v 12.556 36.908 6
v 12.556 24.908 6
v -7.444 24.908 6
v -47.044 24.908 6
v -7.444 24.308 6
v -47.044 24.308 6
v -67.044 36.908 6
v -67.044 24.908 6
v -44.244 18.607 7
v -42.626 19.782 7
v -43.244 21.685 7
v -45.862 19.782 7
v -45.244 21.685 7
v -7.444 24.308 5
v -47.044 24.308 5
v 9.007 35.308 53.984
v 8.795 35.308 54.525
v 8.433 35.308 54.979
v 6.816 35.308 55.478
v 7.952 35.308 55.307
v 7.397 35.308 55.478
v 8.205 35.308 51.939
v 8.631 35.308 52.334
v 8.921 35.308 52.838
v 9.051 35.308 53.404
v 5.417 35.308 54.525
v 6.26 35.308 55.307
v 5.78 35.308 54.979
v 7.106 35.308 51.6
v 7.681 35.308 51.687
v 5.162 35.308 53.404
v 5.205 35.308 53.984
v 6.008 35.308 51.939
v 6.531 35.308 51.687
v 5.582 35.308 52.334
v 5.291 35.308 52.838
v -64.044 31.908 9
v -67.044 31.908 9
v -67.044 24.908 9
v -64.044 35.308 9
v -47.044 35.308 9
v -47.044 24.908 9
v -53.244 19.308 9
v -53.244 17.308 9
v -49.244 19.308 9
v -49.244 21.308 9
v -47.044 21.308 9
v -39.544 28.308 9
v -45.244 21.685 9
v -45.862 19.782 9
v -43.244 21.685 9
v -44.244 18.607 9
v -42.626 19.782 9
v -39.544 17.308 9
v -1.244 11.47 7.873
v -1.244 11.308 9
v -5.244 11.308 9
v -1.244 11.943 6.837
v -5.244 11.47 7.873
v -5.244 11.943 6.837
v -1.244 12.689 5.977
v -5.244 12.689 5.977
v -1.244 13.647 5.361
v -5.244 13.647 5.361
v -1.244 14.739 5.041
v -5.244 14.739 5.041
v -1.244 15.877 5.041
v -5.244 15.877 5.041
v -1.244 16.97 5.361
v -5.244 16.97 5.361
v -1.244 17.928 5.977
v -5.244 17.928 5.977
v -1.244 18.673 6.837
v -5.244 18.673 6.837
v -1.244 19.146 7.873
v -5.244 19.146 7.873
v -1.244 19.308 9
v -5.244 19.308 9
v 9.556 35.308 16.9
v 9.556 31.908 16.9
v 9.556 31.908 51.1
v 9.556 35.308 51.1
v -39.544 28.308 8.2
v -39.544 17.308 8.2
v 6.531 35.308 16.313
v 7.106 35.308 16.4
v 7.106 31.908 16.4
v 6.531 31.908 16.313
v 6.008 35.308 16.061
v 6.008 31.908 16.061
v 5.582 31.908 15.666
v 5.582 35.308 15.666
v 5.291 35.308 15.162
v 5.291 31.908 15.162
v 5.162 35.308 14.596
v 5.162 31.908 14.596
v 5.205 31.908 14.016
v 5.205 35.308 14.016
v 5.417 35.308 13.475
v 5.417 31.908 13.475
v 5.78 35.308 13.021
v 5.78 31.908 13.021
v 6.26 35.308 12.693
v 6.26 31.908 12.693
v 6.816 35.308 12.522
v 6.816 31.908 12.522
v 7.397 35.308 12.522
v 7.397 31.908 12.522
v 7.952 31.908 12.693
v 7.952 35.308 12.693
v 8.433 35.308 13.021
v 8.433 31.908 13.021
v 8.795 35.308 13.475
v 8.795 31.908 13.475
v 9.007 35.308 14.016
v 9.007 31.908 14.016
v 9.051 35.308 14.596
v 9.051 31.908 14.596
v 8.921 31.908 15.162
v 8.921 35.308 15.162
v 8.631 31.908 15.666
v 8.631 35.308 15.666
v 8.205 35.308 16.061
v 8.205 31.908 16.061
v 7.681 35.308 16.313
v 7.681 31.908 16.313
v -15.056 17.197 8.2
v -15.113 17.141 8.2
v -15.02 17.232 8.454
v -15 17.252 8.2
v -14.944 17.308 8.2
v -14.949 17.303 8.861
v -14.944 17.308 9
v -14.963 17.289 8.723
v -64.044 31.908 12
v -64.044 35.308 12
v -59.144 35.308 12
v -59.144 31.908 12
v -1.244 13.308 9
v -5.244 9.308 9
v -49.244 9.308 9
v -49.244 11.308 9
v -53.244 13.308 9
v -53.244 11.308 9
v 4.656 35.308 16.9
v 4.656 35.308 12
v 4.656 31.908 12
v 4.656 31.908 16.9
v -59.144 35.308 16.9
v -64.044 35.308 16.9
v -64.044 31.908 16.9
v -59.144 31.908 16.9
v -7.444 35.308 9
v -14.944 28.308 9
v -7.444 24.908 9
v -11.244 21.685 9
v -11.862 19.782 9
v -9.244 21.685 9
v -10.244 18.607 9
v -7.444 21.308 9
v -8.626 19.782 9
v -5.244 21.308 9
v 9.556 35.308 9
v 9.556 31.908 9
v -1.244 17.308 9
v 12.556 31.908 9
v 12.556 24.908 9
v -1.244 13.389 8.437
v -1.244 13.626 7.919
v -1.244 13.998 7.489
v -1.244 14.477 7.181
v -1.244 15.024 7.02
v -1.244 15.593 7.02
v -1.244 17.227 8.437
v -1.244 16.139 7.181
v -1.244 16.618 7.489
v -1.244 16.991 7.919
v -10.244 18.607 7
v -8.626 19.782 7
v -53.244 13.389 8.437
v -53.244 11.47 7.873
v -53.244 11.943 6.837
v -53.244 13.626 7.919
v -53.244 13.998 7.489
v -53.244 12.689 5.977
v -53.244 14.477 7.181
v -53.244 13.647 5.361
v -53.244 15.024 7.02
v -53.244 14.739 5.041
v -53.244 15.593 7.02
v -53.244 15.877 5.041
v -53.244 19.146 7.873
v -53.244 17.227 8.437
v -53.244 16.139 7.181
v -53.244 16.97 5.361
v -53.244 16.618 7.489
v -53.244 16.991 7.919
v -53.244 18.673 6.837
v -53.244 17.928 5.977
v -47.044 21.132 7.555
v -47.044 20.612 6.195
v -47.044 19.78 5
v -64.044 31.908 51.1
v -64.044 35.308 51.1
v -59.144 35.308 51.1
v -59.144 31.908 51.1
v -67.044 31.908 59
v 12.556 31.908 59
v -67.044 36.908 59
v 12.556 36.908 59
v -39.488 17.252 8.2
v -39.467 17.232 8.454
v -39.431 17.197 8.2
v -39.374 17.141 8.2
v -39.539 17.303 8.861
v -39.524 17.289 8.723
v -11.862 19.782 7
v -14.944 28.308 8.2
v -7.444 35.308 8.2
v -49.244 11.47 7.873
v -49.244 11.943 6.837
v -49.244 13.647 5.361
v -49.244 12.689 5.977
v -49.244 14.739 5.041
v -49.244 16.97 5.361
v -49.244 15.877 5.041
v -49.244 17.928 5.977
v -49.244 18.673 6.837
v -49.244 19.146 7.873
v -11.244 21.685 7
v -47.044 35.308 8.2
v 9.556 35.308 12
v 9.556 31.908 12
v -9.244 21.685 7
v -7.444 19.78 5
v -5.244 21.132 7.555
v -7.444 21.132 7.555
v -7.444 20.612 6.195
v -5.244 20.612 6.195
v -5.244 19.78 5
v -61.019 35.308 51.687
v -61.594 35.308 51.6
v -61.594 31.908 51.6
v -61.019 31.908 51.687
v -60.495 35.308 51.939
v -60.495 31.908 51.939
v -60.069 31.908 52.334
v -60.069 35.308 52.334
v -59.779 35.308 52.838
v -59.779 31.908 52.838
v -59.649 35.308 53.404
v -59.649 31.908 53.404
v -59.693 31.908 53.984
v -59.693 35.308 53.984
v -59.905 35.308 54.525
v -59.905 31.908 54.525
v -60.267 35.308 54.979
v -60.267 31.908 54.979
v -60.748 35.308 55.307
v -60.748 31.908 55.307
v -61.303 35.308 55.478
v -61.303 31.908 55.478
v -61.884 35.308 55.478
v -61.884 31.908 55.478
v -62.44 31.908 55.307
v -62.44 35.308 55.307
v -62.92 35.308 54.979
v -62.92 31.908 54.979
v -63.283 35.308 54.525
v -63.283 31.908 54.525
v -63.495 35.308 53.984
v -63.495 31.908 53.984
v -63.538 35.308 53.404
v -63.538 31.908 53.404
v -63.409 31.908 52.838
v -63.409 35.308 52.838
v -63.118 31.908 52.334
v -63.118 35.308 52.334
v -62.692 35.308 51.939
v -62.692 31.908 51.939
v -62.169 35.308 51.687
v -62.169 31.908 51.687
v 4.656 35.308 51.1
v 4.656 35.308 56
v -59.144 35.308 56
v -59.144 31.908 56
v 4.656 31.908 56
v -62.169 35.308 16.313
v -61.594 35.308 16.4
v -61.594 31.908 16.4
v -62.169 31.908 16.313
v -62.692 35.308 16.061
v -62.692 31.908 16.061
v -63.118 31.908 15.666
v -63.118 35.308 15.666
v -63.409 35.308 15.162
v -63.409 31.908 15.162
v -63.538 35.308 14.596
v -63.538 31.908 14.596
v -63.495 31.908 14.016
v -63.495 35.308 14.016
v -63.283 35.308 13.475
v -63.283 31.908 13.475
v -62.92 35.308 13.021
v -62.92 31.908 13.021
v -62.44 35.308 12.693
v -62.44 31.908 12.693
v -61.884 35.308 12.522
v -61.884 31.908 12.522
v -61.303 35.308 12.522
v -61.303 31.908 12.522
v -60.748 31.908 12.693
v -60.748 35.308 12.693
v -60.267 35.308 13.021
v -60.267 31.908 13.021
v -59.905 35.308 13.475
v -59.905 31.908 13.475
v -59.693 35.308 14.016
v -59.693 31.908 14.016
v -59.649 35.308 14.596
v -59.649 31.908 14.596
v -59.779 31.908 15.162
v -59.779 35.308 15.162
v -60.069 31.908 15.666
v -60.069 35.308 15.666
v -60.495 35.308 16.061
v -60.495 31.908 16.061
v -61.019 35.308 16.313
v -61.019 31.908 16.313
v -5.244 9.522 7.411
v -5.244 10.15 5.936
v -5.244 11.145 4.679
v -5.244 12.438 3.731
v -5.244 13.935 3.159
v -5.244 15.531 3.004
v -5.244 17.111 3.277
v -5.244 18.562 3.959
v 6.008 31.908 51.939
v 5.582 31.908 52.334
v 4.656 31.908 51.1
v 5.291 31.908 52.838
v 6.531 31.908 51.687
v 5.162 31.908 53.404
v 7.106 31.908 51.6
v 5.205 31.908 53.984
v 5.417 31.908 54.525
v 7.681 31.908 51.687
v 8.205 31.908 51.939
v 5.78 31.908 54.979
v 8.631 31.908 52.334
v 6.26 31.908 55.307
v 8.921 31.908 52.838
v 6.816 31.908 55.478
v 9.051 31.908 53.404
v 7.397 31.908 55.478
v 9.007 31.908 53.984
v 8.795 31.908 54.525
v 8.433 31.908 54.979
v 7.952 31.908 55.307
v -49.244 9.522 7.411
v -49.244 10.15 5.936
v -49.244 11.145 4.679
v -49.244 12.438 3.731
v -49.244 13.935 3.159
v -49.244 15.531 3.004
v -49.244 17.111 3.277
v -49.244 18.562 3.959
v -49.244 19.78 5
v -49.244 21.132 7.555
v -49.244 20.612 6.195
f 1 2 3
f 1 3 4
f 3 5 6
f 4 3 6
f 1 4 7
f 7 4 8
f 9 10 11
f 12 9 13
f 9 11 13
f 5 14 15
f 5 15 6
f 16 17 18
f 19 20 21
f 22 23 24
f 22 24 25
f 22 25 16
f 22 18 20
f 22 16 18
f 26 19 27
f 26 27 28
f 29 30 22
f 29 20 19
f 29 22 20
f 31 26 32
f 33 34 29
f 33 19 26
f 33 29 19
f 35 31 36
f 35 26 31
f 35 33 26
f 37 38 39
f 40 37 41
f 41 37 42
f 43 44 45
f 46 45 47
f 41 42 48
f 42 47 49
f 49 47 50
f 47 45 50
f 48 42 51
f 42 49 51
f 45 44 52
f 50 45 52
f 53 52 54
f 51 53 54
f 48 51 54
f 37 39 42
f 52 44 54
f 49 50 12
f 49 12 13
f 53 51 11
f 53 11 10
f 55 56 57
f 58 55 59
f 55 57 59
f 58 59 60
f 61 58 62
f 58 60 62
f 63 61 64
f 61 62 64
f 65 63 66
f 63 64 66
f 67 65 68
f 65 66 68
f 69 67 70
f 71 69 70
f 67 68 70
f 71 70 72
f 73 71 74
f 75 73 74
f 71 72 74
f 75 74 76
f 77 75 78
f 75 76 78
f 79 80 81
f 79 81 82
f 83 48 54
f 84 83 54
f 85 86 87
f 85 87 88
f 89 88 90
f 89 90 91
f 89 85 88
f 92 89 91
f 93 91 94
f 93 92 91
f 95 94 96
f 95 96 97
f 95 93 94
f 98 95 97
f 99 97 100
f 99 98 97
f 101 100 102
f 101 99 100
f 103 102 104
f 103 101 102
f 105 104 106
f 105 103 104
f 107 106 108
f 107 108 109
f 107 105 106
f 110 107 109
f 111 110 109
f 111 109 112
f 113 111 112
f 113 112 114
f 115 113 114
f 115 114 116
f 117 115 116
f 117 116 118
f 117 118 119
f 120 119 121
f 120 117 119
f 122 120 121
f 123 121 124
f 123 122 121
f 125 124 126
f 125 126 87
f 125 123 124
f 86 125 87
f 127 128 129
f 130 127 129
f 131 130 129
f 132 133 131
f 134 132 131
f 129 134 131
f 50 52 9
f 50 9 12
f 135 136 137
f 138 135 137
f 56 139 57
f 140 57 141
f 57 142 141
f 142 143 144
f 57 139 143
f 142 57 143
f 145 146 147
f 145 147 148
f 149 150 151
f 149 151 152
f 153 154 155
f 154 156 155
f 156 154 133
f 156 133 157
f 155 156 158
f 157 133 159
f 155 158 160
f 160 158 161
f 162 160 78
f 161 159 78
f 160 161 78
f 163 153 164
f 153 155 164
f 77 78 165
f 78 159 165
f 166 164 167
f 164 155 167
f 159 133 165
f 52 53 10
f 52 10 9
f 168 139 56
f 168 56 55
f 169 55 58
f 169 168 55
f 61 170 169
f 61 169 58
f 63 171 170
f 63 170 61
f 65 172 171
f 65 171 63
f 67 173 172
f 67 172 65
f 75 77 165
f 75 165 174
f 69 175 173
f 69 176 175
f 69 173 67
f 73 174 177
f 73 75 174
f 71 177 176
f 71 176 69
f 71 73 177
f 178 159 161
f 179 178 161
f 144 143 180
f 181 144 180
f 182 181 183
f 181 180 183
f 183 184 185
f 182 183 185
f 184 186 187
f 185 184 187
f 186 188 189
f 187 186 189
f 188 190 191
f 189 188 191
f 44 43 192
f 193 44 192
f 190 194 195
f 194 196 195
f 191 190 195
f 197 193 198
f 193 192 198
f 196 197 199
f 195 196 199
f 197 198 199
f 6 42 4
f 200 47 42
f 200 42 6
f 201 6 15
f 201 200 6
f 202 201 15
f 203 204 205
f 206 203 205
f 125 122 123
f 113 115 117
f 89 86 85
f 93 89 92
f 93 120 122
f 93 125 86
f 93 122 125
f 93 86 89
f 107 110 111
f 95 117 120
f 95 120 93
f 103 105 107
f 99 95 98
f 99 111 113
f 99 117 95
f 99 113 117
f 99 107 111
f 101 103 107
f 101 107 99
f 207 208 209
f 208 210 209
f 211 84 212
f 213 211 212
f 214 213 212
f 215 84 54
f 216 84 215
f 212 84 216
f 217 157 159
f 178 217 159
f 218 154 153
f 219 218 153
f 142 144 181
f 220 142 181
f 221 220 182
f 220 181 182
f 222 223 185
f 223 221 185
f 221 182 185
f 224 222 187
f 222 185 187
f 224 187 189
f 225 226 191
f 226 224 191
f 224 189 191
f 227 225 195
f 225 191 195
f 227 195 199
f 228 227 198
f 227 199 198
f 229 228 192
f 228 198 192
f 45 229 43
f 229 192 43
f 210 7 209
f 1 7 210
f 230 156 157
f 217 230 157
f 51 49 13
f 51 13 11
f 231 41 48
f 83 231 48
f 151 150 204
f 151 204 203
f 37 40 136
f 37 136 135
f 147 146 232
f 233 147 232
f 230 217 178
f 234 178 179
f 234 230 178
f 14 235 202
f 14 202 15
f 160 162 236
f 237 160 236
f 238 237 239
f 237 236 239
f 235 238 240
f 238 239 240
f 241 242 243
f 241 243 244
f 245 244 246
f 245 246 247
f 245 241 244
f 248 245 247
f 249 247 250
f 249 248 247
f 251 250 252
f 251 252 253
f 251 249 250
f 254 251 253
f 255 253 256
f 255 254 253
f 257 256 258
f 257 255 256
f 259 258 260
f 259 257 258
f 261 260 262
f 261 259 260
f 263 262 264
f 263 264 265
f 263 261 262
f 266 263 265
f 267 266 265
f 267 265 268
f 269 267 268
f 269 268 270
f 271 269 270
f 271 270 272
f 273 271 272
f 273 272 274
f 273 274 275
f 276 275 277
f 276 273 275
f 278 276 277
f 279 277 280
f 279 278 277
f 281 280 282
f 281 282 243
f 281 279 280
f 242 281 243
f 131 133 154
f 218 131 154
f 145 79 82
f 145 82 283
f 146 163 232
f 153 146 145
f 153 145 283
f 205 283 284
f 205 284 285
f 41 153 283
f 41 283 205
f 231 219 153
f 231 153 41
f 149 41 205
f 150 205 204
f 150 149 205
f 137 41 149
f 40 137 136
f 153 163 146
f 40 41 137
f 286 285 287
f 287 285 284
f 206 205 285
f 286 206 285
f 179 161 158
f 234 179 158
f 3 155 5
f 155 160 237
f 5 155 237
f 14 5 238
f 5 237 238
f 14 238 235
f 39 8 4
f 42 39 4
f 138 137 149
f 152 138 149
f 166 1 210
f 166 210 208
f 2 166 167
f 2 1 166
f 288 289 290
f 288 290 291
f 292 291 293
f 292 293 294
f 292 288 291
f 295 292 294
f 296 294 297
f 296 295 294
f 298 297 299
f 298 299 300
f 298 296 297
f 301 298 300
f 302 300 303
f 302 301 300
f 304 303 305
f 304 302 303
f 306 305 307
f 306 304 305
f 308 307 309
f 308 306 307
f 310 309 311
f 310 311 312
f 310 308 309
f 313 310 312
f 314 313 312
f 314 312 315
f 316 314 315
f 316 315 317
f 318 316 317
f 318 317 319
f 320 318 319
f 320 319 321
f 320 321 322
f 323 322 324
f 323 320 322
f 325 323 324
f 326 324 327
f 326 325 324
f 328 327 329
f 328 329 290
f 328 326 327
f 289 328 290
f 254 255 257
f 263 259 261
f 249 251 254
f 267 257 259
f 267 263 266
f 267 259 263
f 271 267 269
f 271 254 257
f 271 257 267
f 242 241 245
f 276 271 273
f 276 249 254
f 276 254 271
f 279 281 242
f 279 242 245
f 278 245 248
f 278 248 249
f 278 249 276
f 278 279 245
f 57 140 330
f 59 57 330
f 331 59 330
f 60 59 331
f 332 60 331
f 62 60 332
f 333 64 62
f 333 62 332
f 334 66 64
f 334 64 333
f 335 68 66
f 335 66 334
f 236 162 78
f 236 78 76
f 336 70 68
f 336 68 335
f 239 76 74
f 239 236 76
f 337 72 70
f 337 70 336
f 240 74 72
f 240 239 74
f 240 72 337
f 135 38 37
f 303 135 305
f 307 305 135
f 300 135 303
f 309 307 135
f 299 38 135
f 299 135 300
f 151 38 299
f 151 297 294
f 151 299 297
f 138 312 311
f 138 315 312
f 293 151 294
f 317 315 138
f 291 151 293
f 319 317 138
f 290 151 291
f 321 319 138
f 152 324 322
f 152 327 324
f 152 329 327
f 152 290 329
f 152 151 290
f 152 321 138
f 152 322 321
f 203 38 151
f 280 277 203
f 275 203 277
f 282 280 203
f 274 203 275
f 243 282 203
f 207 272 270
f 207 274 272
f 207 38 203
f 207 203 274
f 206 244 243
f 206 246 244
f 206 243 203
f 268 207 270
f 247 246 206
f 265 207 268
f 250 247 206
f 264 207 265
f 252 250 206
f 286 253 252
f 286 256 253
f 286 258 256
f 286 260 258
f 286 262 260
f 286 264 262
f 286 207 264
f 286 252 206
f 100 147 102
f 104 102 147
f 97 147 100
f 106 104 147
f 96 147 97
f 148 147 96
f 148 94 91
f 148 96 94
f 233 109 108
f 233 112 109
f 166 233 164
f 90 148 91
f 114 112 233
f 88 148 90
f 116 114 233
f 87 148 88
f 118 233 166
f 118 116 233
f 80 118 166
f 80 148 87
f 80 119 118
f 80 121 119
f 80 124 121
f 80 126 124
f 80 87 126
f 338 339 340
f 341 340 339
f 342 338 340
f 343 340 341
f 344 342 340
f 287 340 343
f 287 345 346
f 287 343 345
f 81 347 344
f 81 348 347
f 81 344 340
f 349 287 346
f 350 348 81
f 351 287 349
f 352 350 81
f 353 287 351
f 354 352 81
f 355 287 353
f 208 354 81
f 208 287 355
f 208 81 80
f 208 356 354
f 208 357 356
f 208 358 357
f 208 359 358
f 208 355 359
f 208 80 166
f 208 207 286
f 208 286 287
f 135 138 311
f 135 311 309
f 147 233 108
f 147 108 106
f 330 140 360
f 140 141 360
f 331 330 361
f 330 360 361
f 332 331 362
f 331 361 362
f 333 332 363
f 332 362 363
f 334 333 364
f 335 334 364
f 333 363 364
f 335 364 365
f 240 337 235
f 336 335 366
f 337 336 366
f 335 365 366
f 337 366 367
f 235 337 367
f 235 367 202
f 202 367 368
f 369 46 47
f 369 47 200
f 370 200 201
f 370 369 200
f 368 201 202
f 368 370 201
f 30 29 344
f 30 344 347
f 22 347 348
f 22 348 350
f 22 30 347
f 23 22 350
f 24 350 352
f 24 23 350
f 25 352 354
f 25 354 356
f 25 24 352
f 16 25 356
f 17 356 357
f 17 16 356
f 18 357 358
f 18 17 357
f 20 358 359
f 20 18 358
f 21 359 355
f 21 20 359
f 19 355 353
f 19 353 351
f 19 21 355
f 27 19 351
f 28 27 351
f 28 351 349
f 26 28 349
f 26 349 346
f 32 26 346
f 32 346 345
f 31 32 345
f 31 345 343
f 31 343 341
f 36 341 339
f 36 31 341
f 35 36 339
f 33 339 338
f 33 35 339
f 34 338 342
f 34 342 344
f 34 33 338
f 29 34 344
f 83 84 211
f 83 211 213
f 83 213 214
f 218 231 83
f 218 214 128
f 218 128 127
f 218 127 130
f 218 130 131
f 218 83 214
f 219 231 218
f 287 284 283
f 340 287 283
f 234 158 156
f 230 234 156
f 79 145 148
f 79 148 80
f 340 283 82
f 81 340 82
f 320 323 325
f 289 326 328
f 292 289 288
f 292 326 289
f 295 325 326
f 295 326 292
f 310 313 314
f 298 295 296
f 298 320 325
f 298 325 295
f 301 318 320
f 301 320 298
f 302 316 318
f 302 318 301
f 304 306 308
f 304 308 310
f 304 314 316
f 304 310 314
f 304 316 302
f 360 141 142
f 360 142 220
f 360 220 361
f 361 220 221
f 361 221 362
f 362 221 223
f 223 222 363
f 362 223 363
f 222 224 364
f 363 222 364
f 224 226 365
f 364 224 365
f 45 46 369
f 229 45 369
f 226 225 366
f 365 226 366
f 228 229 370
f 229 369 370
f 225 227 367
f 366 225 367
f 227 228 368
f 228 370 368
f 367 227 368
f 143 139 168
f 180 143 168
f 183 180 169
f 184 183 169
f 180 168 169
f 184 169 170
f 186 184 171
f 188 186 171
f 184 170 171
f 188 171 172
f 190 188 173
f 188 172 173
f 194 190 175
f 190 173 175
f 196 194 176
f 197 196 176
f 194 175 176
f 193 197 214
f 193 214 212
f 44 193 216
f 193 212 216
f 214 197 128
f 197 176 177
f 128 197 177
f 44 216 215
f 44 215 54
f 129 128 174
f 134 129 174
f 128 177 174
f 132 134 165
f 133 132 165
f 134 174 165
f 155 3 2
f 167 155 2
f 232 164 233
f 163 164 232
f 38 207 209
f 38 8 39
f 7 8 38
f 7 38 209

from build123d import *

# Parameters (mm, degrees)
IZIM2_W                          = 40
IZIM2_H                          = 16
Y_KSEKLIK_EKSTR_ZYON4_DEPTH      = 9
Y_KSEKLIK_EKSTR_ZYON5_DEPTH      = 2
Y_KSEKLIK_EKSTR_ZYON5_DEPTH_BACK = 42
Y_KSEKLIK_EKSTR_ZYON6_DEPTH      = 6
Y_KSEKLIK_EKSTR_ZYON6_DEPTH_BACK = 46
KES_EKSTR_ZYON1_DEPTH            = 52
KES_EKSTR_ZYON2_DEPTH            = 53.347615077
KES_EKSTR_ZYON2_DEPTH_BACK       = 52
Y_KSEKLIK_EKSTR_ZYON7_START      = -44
Y_KSEKLIK_EKSTR_ZYON7_DEPTH      = 44
KES_EKSTR_ZYON4_DEPTH            = 44
KES_EKSTR_ZYON8_START            = -2.2
KES_EKSTR_ZYON8_DEPTH            = 2.2
KES_EKSTR_ZYON9_DEPTH            = 2.2
IZIM14_W                         = 39.6
IZIM14_H                         = 3
ARALIK_EKS_DEPTH                 = 0.6
Y_KSEKLIK_EKSTR_ZYON9_DEPTH      = 12
Y_KSEKLIK_EKSTR_ZYON10_DEPTH     = 50
IZIM17_R                         = 1.95
IZIM17_W                         = 4.9
IZIM17_H                         = 4.9
Y_KSEKLIK_EKSTR_ZYON11_DEPTH     = 3.4
KES_EKSTR_ZYON11_DEPTH           = 0.8
KES_EKSTR_ZYON12_DEPTH           = 2


with BuildPart() as part:
    # Çizim2 → Yükseklik-Ekstrüzyon4 (new body)
    with BuildSketch(Plane.XY):
        with Locations((-27.243761407, 15.308213235)):
            Rectangle(IZIM2_W, IZIM2_H)
    extrude(amount=Y_KSEKLIK_EKSTR_ZYON4_DEPTH)

    # Çizim3 → Yükseklik-Ekstrüzyon5 (add, two sides: drawn at the far end of the back side and taken through both)
    with BuildSketch(Plane(origin=(-7.243761407, 0, 0), x_dir=(0, 0, -1), z_dir=(1, 0, 0)).offset(-Y_KSEKLIK_EKSTR_ZYON5_DEPTH_BACK)):
        with BuildLine():
            ThreePointArc((-9, 9.308213235), (-3, 15.308213235), (-9, 21.308213235))
            Line((-9, 21.308213235), (-9, 19.308213235))
            ThreePointArc((-9, 19.308213235), (-5, 15.308213235), (-9, 11.308213235))
            Line((-9, 11.308213235), (-9, 9.308213235))
        make_face()
    extrude(amount=Y_KSEKLIK_EKSTR_ZYON5_DEPTH + Y_KSEKLIK_EKSTR_ZYON5_DEPTH_BACK)

    # Çizim3<3> → Yükseklik-Ekstrüzyon6 (add, two sides: drawn at the far end of the back side and taken through both)
    with BuildSketch(Plane(origin=(-7.243761407, 0, 0), x_dir=(0, 0, -1), z_dir=(1, 0, 0)).offset(-Y_KSEKLIK_EKSTR_ZYON6_DEPTH_BACK)):
        with BuildLine():
            ThreePointArc((-9, 11.308213235), (-5, 15.308213235), (-9, 19.308213235))
            Line((-9, 19.308213235), (-9, 11.308213235))
        make_face()
    extrude(amount=Y_KSEKLIK_EKSTR_ZYON6_DEPTH + Y_KSEKLIK_EKSTR_ZYON6_DEPTH_BACK)

    # Çizim4 → Kes-Ekstrüzyon1 (cut)
    with BuildSketch(Plane(origin=(-1.243761407, 0, 0), x_dir=(0, 0, -1), z_dir=(1, 0, 0))):
        with BuildLine():
            Line((-9, 17.308213235), (-9, 13.308213235))
            ThreePointArc((-9, 13.308213235), (-7, 15.308213235), (-9, 17.308213235))
        make_face()
    extrude(amount=-KES_EKSTR_ZYON1_DEPTH, mode=Mode.SUBTRACT)

    # Çizim3<4> → Kes-Ekstrüzyon2 (cut, two sides: drawn at the far end of the back side and taken through both)
    with BuildSketch(Plane(origin=(-7.243761407, 0, 0), x_dir=(0, 0, -1), z_dir=(1, 0, 0)).offset(-KES_EKSTR_ZYON2_DEPTH_BACK)):
        with BuildLine():
            Line((-9, 23.308213235), (-9, 21.308213235))
            ThreePointArc((-9, 21.308213235), (-3, 15.308213235), (-9, 9.308213235))
            Line((-9, 9.308213235), (-9, 7.308213235))
            Line((-9, 7.308213235), (0, 7.308213235))
            Line((0, 7.308213235), (0, 23.308213235))
            Line((0, 23.308213235), (-9, 23.308213235))
        make_face()
    extrude(amount=KES_EKSTR_ZYON2_DEPTH + KES_EKSTR_ZYON2_DEPTH_BACK, mode=Mode.SUBTRACT)

    # Çizim7 → Yükseklik-Ekstrüzyon7 (add)
    with BuildSketch(Plane(origin=(-5.243761407, 0, 0), x_dir=(0, 0, -1), z_dir=(1, 0, 0)).offset(Y_KSEKLIK_EKSTR_ZYON7_START)):
        with BuildLine():
            Line((-5, 19.78034919), (-5, 24.308213235))
            Line((-5, 24.308213235), (-9, 24.308213235))
            Line((-9, 24.308213235), (-9, 21.308213235))
            ThreePointArc((-9, 21.308213235), (-6.859067461, 20.913247389), (-5, 19.78034919))
        make_face()
    extrude(amount=Y_KSEKLIK_EKSTR_ZYON7_DEPTH)

    # Çizim8 → Kes-Ekstrüzyon4 (cut)
    with BuildSketch(Plane.XY.offset(9)):
        Polygon((-7.443761407, 24.308213235), (-7.443761407, 21.308213235), (-5.243761407, 21.308213235), (-5.243761407, 22.308213235), (-5.243761407, 24.308213235), align=None)
        Polygon((-49.243761407, 24.308213235), (-47.043761407, 24.308213235), (-47.043761407, 21.308213235), (-49.243761407, 21.308213235), (-49.243761407, 22.308213235), align=None)
    extrude(amount=-KES_EKSTR_ZYON4_DEPTH, mode=Mode.SUBTRACT)

    # Çizim7<3> → Kes-Ekstrüzyon8 (cut)
    with BuildSketch(Plane(origin=(-5.243761407, 0, 0), x_dir=(0, 0, -1), z_dir=(1, 0, 0)).offset(KES_EKSTR_ZYON8_START)):
        with BuildLine():
            Line((-5, 19.78034919), (-5, 24.308213235))
            Line((-5, 24.308213235), (-9, 24.308213235))
            Line((-9, 24.308213235), (-9, 21.308213235))
            ThreePointArc((-9, 21.308213235), (-6.859067461, 20.913247389), (-5, 19.78034919))
        make_face()
    extrude(amount=KES_EKSTR_ZYON8_DEPTH, mode=Mode.SUBTRACT)

    # Çizim12 → Kes-Ekstrüzyon9 (cut)
    with BuildSketch(Plane.ZY.offset(49.243761407)):
        with BuildLine():
            Line((5, 19.78034919), (5, 21.308213235))
            Line((5, 21.308213235), (9, 21.308213235))
            ThreePointArc((9, 21.308213235), (6.859067461, 20.913247389), (5, 19.78034919))
        make_face()
    extrude(amount=-KES_EKSTR_ZYON9_DEPTH, mode=Mode.SUBTRACT)

    # Çizim14 → aralik_eks (add)
    with BuildSketch(Plane(origin=(0, 24.308213235, 0), x_dir=(1, 0, 0), z_dir=(0, 1, 0))):
        with Locations((-27.243761407, -7.5)):
            Rectangle(IZIM14_W, IZIM14_H)
    extrude(amount=ARALIK_EKS_DEPTH)

    # Çizim15 → Yükseklik-Ekstrüzyon9 (add)
    with BuildSketch(Plane(origin=(0, 24.908213235, 0), x_dir=(1, 0, 0), z_dir=(0, 1, 0))):
        Polygon((-47.043761407, -6), (-67.043761407, -6), (-67.043761407, -9), (-47.043761407, -9), (-7.443761407, -9), (12.556238593, -9), (12.556238593, -6), (-7.443761407, -6), align=None)
    extrude(amount=Y_KSEKLIK_EKSTR_ZYON9_DEPTH)

    # Çizim16 → Yükseklik-Ekstrüzyon10 (add)
    with BuildSketch(Plane.XY.offset(9)):
        Polygon((-67.043761407, 36.908213235), (12.556238593, 36.908213235), (12.556238593, 31.908213235), (9.556238593, 31.908213235), (9.556238593, 35.308213235), (-64.043761407, 35.308213235), (-64.043761407, 31.908213235), (-67.043761407, 31.908213235), align=None)
    extrude(amount=Y_KSEKLIK_EKSTR_ZYON10_DEPTH)

    # Çizim17 → Yükseklik-Ekstrüzyon11 (add)
    # profile 1 of 3: a face of its own
    with BuildSketch(Plane.XZ.offset(-35.308213235)):
        Polygon((9.556238593, 59), (-64.043761407, 59), (-64.043761407, 51.1), (-59.143761407, 51.1), (-59.143761407, 56), (4.656238593, 56), (4.656238593, 51.1), (9.556238593, 51.1), align=None)
        with Locations((7.106238593, 53.55)):
            Circle(IZIM17_R, mode=Mode.SUBTRACT)
        with Locations((-61.593761407, 53.55)):
            Circle(IZIM17_R, mode=Mode.SUBTRACT)
    # profile 2 of 3: a face of its own
    with BuildSketch(Plane.XZ.offset(-35.308213235)):
        with Locations((7.106238593, 14.45)):
            Rectangle(IZIM17_W, IZIM17_H)
        with Locations((7.106238593, 14.45)):
            Circle(IZIM17_R, mode=Mode.SUBTRACT)
    # profile 3 of 3: a face of its own
    with BuildSketch(Plane.XZ.offset(-35.308213235)):
        with Locations((-61.593761407, 14.45)):
            Rectangle(IZIM17_W, IZIM17_H)
        with Locations((-61.593761407, 14.45)):
            Circle(IZIM17_R, mode=Mode.SUBTRACT)
    extrude(amount=Y_KSEKLIK_EKSTR_ZYON11_DEPTH)

    # Çizim18 → Kes-Ekstrüzyon11 (cut)
    with BuildSketch(Plane.XY.offset(9)):
        with BuildLine():
            Line((-39.543761407, 28.308213235), (-39.543761407, 17.308213235))
            ThreePointArc((-39.543761407, 17.308213235), (-38.000834326, 15.938341904), (-36.30655982, 14.760799827))
            Line((-36.30655982, 14.760799827), (-18.180962994, 14.760799827))
            ThreePointArc((-18.180962994, 14.760799827), (-16.486688488, 15.938341904), (-14.943761407, 17.308213235))
            Line((-14.943761407, 17.308213235), (-14.943761407, 28.308213235))
            Line((-14.943761407, 28.308213235), (-7.443761407, 35.308213235))
            Line((-7.443761407, 35.308213235), (-47.043761407, 35.308213235))
            Line((-47.043761407, 35.308213235), (-39.543761407, 28.308213235))
        make_face()
    extrude(amount=-KES_EKSTR_ZYON11_DEPTH, mode=Mode.SUBTRACT)

    # Çizim19 → Kes-Ekstrüzyon12 (cut)
    with BuildSketch(Plane.XY.offset(9)):
        Polygon((-10.243761407, 18.606911619), (-8.625727418, 19.782482123), (-9.243761407, 21.684595156), (-11.243761407, 21.684595156), (-11.861795396, 19.782482123), align=None)
        Polygon((-42.625727418, 19.782482123), (-44.243761407, 18.606911619), (-45.861795396, 19.782482123), (-45.243761407, 21.684595156), (-43.243761407, 21.684595156), align=None)
    extrude(amount=-KES_EKSTR_ZYON12_DEPTH, mode=Mode.SUBTRACT)


solid = part.part
